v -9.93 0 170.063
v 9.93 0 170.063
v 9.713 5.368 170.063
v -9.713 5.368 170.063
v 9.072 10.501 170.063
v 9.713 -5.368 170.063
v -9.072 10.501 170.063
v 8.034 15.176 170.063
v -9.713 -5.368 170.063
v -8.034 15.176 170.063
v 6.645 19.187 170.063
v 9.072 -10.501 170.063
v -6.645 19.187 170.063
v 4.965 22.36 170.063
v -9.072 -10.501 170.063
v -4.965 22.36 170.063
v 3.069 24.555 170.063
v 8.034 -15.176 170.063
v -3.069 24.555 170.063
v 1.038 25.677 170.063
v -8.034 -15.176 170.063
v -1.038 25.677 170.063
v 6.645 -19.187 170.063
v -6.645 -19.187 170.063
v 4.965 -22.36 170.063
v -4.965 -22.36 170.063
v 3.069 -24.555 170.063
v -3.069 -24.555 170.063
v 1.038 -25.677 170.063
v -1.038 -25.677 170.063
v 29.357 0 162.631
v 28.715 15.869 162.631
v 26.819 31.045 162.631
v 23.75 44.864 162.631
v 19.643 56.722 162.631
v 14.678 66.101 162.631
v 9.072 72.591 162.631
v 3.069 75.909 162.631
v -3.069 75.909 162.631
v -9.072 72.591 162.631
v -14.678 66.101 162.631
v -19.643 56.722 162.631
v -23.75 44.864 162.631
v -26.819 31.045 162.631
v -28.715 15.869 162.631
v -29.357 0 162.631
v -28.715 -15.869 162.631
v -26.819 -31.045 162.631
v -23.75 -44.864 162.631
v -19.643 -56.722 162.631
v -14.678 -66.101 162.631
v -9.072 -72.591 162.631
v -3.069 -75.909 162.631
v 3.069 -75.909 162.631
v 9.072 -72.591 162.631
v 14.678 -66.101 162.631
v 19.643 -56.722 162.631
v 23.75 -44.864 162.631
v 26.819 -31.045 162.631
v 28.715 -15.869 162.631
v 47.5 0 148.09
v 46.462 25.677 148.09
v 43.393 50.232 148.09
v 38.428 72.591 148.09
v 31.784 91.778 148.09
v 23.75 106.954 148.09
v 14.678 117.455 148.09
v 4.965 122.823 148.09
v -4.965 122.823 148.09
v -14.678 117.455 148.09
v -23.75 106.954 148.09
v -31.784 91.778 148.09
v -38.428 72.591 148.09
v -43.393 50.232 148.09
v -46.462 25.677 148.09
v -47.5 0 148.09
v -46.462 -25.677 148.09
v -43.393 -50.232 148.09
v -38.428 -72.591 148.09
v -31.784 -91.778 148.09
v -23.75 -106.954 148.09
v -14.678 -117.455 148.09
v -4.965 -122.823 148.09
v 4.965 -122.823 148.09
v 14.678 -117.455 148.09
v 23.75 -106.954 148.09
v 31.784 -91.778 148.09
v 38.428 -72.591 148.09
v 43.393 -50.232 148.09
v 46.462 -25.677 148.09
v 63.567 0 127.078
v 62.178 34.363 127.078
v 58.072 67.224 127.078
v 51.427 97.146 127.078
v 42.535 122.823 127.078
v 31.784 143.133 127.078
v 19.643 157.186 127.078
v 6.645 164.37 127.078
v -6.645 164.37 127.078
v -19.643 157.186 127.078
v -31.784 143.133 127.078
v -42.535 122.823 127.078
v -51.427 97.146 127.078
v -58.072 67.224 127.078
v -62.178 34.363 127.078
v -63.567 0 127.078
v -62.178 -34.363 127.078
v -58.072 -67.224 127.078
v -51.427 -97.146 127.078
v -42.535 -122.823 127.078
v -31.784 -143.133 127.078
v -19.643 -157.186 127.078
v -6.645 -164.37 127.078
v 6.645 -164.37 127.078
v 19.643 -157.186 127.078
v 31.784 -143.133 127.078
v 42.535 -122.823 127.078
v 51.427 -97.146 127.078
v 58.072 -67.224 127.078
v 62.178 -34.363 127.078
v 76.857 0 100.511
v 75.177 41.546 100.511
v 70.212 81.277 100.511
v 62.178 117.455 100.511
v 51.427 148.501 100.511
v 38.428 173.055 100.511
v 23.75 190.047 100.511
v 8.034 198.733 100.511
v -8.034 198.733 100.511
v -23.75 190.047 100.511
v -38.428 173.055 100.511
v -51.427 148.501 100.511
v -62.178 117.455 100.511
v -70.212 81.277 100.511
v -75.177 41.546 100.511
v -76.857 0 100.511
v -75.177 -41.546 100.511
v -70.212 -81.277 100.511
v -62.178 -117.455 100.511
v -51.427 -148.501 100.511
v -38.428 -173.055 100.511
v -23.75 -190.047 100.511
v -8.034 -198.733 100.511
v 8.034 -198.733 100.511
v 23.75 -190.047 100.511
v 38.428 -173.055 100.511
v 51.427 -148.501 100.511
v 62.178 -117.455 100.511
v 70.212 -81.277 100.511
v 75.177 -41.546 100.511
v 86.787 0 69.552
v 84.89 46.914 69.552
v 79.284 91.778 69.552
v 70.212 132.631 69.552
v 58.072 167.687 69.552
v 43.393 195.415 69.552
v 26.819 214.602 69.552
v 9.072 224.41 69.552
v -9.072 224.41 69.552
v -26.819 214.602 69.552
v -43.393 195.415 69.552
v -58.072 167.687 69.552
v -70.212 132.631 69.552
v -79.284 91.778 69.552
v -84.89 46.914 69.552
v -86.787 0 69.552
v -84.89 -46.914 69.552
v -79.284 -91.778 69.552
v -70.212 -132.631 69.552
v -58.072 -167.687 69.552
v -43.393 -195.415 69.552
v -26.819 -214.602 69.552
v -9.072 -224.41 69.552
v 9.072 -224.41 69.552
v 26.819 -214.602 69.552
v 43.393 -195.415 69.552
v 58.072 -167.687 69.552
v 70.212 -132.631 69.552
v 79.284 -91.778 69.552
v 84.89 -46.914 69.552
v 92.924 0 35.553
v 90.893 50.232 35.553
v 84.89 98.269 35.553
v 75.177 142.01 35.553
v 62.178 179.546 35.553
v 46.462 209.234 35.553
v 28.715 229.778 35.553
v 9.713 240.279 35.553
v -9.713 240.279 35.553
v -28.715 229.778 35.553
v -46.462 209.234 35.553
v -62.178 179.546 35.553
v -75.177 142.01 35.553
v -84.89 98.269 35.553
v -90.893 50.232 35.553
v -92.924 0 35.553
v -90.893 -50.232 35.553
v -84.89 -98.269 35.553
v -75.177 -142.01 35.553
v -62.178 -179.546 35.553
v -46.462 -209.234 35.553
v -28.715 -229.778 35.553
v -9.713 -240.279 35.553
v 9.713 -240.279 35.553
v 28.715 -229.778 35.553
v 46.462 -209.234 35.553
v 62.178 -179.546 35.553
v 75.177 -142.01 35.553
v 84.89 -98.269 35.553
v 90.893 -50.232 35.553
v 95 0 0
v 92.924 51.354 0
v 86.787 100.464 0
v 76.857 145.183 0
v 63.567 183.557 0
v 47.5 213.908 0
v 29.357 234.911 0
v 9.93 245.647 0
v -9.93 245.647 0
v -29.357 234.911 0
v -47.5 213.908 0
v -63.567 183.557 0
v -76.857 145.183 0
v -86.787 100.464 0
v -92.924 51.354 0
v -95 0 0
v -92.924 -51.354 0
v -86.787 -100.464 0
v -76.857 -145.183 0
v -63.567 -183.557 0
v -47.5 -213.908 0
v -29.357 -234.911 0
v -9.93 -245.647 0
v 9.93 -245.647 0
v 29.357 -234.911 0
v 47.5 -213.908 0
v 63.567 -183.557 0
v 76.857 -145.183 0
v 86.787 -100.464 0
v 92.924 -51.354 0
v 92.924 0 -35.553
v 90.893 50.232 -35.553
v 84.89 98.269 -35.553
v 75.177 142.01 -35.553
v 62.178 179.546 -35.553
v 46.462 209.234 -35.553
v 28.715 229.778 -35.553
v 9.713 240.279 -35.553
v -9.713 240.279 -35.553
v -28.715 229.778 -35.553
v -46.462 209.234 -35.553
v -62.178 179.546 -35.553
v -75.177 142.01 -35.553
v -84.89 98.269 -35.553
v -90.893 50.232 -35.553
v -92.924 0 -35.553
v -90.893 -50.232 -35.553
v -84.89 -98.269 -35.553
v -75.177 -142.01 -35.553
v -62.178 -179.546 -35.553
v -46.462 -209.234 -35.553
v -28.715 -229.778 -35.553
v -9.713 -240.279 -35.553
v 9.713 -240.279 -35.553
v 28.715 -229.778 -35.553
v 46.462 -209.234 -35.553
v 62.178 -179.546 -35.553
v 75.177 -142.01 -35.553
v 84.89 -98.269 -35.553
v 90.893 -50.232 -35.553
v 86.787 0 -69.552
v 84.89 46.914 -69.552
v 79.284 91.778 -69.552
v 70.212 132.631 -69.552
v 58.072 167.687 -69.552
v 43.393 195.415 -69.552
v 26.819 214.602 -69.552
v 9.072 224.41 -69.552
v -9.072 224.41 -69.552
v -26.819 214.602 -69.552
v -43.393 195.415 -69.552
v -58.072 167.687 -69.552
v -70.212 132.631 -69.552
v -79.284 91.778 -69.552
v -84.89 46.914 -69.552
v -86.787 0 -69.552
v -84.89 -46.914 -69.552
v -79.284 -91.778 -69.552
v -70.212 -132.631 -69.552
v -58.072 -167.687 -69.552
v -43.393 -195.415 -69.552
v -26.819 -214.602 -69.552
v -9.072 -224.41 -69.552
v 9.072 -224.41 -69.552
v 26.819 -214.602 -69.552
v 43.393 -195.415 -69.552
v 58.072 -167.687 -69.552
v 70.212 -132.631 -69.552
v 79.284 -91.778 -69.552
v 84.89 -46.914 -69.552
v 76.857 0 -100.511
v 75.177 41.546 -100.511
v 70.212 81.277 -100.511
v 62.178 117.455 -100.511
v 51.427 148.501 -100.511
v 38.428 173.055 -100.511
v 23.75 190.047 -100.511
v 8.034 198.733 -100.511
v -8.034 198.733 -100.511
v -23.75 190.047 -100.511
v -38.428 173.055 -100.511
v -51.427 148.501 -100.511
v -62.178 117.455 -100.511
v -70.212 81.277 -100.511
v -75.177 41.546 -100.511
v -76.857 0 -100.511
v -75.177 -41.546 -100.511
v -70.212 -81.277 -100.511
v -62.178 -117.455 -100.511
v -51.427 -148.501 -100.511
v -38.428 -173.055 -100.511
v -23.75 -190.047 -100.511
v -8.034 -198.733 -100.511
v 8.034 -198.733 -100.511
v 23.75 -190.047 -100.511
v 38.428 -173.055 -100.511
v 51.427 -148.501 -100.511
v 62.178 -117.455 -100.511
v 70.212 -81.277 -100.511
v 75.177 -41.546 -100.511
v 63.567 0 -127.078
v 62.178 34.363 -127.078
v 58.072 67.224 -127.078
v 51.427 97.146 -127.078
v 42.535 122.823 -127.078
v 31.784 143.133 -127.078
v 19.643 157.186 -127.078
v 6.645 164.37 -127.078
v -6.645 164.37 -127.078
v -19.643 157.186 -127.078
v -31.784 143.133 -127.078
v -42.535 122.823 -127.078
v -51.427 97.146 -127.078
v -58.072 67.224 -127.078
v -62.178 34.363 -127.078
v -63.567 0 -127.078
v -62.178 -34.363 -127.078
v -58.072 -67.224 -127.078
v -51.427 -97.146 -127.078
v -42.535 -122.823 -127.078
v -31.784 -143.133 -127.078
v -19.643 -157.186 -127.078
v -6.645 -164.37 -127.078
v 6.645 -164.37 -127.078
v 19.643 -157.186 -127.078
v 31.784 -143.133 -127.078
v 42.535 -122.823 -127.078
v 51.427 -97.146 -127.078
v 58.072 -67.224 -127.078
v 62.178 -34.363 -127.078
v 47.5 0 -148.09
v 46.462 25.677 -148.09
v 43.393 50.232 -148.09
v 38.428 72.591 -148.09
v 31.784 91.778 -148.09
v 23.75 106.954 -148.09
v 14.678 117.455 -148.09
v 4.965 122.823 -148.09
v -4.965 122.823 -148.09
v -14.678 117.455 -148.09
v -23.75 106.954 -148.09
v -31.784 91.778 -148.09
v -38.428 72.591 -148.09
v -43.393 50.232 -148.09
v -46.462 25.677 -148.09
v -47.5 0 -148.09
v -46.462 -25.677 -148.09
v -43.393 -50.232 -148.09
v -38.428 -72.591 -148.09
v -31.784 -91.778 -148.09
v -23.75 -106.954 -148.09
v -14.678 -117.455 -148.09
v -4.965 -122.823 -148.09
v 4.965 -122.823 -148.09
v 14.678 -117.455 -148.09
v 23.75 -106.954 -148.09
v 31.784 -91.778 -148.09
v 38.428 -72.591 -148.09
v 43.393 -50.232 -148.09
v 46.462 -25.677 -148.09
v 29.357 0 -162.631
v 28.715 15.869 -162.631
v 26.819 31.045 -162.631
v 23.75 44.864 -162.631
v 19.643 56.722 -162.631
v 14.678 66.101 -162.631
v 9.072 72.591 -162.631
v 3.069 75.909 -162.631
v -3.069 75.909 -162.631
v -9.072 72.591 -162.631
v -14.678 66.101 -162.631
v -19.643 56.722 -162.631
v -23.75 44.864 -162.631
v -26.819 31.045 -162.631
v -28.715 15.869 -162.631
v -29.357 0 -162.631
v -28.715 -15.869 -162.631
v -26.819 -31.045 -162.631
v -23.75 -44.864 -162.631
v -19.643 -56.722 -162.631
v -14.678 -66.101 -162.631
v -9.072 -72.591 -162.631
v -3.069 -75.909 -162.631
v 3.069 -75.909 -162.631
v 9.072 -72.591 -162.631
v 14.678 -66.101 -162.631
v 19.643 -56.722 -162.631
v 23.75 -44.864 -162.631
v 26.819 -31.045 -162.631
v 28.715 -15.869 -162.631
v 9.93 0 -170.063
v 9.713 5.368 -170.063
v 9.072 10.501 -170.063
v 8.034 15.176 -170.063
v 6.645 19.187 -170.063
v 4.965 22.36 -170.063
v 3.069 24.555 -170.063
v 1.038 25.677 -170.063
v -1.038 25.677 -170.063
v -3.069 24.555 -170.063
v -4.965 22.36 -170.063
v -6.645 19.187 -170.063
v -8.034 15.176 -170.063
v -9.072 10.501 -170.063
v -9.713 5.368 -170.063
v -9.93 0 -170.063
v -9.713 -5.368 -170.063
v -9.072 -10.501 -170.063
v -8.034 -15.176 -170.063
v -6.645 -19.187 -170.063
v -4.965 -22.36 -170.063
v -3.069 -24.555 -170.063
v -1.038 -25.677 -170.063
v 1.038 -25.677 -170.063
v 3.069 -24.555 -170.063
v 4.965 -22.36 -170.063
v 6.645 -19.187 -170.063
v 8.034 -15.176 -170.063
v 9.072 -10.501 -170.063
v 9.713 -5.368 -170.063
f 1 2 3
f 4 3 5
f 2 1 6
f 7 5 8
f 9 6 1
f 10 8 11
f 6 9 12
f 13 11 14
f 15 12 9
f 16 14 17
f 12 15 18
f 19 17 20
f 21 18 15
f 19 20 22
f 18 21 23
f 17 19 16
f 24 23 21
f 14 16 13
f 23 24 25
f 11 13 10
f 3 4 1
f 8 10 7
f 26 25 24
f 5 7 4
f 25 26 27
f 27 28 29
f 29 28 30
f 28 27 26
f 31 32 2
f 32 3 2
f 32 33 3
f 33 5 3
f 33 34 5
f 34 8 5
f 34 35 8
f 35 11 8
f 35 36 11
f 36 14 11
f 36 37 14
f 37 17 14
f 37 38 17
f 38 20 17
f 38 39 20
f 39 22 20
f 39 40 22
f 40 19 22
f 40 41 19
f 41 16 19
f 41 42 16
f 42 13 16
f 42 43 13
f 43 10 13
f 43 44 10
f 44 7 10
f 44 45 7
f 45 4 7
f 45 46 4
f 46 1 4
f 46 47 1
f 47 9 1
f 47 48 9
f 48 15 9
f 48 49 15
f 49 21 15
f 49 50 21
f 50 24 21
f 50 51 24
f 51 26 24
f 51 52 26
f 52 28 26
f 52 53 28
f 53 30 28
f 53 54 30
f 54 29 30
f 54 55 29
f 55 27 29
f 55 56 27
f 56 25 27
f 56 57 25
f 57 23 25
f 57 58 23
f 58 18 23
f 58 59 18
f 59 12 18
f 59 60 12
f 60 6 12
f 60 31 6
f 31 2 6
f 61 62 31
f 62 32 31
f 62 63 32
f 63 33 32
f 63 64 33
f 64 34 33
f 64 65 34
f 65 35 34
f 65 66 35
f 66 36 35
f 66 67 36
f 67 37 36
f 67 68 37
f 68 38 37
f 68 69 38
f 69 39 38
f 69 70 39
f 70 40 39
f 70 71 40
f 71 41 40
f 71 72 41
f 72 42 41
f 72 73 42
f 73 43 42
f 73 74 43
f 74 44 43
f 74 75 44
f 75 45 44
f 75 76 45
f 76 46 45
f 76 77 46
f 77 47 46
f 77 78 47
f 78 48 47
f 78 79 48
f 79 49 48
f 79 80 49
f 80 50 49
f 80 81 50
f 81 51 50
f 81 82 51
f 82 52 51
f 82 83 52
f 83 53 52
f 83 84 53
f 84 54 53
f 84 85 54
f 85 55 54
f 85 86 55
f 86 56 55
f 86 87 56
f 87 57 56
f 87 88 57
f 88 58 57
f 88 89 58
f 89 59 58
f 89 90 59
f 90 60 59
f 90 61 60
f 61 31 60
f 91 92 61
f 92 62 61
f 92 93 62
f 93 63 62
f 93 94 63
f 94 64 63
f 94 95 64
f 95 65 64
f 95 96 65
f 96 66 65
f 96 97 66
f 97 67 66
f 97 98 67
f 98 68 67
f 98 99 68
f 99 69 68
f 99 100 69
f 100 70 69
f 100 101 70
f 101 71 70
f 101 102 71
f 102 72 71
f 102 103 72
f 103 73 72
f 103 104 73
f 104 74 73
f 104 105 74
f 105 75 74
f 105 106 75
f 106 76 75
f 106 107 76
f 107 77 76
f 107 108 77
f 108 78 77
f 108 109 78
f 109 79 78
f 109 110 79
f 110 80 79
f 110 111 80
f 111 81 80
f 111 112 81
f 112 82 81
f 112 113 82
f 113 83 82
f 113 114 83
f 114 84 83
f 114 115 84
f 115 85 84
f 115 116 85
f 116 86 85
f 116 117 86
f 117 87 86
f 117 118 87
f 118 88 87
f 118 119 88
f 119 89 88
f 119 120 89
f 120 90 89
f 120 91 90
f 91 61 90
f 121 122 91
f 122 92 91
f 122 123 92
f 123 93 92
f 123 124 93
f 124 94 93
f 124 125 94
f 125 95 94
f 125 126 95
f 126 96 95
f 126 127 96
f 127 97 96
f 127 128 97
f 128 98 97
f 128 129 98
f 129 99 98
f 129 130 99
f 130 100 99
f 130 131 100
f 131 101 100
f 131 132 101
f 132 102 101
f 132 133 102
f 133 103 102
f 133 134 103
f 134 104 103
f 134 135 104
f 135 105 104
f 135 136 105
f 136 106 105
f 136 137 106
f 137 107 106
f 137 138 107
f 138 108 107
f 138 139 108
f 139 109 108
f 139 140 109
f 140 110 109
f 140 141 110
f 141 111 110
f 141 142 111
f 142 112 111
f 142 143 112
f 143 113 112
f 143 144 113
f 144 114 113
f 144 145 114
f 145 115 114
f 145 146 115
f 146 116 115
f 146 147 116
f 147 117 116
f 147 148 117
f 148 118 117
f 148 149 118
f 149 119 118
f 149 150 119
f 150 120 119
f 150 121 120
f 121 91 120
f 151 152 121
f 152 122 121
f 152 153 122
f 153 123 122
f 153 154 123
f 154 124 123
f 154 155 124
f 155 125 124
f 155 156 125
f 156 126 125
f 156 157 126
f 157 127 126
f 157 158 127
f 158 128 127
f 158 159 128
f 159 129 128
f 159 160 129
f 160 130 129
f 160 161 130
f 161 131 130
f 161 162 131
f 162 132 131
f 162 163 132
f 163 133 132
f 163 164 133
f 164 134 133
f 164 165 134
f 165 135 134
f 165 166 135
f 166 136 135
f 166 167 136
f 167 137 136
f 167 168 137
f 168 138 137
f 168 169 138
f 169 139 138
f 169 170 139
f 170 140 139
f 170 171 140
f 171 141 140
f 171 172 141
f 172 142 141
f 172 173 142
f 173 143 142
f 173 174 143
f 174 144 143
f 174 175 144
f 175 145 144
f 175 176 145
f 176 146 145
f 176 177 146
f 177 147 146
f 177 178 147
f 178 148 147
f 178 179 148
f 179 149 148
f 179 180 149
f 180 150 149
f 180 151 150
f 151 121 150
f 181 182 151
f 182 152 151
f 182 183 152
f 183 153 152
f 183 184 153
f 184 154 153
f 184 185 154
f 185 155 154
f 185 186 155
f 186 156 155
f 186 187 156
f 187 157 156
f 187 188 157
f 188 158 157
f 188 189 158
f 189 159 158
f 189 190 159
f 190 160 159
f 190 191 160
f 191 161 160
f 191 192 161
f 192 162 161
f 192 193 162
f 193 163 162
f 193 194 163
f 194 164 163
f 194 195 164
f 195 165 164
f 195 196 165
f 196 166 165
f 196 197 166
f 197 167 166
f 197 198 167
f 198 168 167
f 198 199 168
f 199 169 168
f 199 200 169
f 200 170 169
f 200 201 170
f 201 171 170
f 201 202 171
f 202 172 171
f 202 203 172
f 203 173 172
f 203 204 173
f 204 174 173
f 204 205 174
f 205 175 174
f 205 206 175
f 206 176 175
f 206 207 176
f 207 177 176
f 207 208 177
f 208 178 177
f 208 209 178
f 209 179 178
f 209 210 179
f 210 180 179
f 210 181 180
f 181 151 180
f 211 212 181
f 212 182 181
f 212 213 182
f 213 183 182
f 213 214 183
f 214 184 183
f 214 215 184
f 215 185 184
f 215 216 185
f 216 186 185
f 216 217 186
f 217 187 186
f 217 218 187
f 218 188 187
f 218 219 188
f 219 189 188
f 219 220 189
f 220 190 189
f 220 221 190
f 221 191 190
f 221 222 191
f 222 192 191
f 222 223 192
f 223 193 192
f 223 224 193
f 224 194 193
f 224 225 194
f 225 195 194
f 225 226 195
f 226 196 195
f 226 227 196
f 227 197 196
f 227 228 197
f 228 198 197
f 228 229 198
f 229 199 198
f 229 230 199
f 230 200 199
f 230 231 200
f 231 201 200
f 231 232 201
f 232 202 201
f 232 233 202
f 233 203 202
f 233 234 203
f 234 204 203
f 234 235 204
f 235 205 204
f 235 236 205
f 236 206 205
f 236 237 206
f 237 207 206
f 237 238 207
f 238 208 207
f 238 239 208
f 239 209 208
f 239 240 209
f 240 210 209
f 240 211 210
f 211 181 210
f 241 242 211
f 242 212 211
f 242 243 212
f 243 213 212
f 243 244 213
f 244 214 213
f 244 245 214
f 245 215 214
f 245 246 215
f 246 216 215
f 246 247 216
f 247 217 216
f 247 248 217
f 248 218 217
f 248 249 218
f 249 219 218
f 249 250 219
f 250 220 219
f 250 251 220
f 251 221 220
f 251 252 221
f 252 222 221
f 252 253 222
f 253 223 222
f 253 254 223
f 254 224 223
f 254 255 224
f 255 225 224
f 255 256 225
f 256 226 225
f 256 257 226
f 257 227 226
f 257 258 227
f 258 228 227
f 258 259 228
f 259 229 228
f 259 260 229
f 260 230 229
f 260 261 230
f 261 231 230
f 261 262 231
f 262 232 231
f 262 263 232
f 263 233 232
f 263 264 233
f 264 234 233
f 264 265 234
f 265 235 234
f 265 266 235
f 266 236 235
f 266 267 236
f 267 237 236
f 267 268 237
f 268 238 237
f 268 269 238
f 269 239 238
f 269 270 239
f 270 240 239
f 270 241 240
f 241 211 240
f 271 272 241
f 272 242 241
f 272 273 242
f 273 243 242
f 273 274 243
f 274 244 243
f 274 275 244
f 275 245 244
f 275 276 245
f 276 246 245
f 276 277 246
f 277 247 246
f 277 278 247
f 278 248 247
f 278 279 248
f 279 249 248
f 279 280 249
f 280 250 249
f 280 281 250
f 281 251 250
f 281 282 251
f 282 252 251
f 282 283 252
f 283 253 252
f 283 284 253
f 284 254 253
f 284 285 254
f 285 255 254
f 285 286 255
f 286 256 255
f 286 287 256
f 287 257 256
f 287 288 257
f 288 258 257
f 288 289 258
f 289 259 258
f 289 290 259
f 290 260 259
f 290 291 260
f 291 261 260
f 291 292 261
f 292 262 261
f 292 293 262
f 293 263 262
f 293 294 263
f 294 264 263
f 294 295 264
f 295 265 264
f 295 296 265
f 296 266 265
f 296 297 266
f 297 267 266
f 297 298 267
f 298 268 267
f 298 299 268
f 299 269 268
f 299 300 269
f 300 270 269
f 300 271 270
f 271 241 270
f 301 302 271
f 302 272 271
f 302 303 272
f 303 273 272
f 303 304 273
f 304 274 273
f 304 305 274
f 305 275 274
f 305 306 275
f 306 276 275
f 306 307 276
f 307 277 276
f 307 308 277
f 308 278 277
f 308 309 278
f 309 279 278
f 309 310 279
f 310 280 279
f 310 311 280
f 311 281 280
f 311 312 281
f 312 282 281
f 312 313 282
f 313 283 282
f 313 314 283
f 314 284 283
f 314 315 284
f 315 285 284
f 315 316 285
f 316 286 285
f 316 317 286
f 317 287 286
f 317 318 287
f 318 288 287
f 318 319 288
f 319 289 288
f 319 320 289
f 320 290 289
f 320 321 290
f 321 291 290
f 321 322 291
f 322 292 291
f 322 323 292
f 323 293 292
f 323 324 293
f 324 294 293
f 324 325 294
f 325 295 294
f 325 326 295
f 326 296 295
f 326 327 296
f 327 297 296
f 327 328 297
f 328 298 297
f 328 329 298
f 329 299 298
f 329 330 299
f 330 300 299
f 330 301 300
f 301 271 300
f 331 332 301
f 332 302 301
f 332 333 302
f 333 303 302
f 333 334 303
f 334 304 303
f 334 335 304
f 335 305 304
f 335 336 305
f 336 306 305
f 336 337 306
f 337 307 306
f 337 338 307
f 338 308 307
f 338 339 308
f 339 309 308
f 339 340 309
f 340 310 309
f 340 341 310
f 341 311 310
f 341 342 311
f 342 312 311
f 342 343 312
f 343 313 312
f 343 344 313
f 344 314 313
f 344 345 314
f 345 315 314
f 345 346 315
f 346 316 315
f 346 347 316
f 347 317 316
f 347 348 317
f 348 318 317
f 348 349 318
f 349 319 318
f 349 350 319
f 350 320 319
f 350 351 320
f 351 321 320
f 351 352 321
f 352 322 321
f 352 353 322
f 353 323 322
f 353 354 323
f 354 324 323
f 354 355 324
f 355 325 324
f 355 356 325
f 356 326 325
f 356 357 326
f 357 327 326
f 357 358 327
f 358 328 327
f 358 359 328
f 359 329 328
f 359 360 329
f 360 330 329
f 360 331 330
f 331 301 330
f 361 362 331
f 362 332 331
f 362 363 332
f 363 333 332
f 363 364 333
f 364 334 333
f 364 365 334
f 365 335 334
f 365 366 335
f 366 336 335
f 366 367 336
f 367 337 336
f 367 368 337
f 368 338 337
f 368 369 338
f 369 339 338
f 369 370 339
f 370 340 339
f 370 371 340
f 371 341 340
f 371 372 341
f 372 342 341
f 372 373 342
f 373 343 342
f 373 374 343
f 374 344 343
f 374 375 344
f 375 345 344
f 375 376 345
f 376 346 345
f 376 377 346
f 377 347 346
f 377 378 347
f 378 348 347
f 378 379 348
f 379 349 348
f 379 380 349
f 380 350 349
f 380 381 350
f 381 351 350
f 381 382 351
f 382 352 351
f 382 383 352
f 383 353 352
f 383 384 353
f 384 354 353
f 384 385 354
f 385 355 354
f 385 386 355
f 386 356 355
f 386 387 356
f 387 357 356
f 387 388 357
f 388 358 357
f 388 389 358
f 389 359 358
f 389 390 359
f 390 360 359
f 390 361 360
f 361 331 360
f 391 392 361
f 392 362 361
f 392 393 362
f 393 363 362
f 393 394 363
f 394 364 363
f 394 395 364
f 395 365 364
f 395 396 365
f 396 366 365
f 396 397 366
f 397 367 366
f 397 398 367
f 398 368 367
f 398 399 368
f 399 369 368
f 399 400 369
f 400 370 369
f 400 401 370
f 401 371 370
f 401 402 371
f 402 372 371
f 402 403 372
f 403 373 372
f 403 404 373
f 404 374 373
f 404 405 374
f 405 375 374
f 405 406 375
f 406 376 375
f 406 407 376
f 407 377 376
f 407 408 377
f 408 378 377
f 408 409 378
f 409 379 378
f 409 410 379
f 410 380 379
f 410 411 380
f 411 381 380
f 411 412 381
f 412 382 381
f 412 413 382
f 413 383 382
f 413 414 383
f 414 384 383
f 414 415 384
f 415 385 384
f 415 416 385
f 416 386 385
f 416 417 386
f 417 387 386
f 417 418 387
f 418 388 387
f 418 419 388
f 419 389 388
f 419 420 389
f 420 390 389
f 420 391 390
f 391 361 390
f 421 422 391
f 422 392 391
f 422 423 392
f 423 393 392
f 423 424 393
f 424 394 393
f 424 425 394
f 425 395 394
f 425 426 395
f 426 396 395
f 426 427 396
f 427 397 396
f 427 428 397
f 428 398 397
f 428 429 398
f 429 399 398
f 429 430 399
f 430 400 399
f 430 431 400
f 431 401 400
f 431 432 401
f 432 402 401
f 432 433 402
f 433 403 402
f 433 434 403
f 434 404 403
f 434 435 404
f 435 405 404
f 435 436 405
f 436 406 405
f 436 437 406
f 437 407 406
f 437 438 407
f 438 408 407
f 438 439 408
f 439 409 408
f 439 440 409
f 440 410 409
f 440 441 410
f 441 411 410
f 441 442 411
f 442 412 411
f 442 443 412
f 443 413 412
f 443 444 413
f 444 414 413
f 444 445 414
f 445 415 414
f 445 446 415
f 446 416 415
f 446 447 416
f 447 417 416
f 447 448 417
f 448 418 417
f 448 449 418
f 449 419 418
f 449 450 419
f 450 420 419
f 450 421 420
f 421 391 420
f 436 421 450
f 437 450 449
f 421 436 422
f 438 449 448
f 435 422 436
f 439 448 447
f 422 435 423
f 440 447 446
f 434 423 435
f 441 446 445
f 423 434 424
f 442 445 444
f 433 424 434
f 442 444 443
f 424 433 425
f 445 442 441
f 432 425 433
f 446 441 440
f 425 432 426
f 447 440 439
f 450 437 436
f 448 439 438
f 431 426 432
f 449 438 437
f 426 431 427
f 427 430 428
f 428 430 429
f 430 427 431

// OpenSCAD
// Generated by SolidPython 1.0.1 on 2020-07-29 00:46:46


scale(v = [5, 13, 9]) {
	sphere(r = 19);
}
/***********************************************
*********      SolidPython code:      **********
************************************************
 
# import packages: SolidPython
from solid import *
from solid.utils import *
from itertools import chain, combinations, permutations


class Resize:

    def __init__(self, scad_file):
        self.scad_file = scad_file
        #self.scad_file = import_scad(scad_file)
        # cone/cylinder param:
        self.r1 = 0
        self.r2 = 0
        self.h = 0
        # rectangular prism param:
        self.w = 0
        self.l = 0
        # ellipse param:
        self.r = 0

    # import OpenScad code (file name corresponds to shape)


    # classify shape + parameters
    def assign(self, param1, param2, param3):
        if self.scad_file == 'cone.scad':
            self.r1 = param1
            self.r2 = param2
            self.h = param3
        elif self.scad_file == 'cylinder.scad':
            self.r1 = param1
            self.r2 = param2
            self.h = param3
        elif self.scad_file == 'rectangularPrism.scad':
            self.h = param1
            self.l = param2
            self.w = param3
        else:
            self.r = param1
            self.h = param2

    # resize parameters
    def iterate(self):
        x = range(3, 20, 2)
        i = 1
        if self.scad_file == 'cone.scad':
            tempList = list(permutations(x, 2))
            for temp in tempList:
                param1 = temp[0]
                param2 = temp[1]
                filepath = 'produced_scad_files/' + 'cone' + str(param1) + '_' + str(param2) + '_' + '.scad'
                scad_render_to_file(cylinder(h=param1, r1=param2, r2=0), filepath)

        elif self.scad_file == 'cylinder.scad':
            tempList = list(permutations(x, 3))
            for temp in tempList:
                param1 = temp[0]
                param2 = temp[1]
                filepath = 'produced_scad_files/' + 'cylinder' + str(param1) + '_' + str(param2) + '_' + '.scad'
                scad_render_to_file(cylinder(h=param1, r1=param2, r2=param2), filepath)

        elif self.scad_file == 'rectangularPrism.scad':
            tempList = list(permutations(x, 3))
            for temp in tempList:
                param1 = temp[0]
                param2 = temp[1]
                param3 = temp[2]
                filepath = 'produced_scad_files/' + 'rectangularPrism' + str(param1) + '_' + str(param2) + '_' + str(
                    param3) + '.scad'
                scad_render_to_file(cube(size=(param1, param2, param3)), filepath)

        elif self.scad_file == 'ellipse.scad':
            tempList = list(permutations(x, 4))
            for temp in tempList:
                param1 = temp[0]
                param2 = temp[1]
                param3 = temp[2]
                param4 = temp[3]
                filepath = 'produced_scad_files/' + 'ellipse' + str(param1) + '_' + str(param2) + '_' + str(param3) + '_' + str(param4) + '.scad'
                scad_render_to_file(scale([param1, param2, param3])(sphere(r=param4)), filepath)

    def render_to_scadfile(self):
        scad_render_to_file(scad, 'example.scad') 
 
************************************************/
